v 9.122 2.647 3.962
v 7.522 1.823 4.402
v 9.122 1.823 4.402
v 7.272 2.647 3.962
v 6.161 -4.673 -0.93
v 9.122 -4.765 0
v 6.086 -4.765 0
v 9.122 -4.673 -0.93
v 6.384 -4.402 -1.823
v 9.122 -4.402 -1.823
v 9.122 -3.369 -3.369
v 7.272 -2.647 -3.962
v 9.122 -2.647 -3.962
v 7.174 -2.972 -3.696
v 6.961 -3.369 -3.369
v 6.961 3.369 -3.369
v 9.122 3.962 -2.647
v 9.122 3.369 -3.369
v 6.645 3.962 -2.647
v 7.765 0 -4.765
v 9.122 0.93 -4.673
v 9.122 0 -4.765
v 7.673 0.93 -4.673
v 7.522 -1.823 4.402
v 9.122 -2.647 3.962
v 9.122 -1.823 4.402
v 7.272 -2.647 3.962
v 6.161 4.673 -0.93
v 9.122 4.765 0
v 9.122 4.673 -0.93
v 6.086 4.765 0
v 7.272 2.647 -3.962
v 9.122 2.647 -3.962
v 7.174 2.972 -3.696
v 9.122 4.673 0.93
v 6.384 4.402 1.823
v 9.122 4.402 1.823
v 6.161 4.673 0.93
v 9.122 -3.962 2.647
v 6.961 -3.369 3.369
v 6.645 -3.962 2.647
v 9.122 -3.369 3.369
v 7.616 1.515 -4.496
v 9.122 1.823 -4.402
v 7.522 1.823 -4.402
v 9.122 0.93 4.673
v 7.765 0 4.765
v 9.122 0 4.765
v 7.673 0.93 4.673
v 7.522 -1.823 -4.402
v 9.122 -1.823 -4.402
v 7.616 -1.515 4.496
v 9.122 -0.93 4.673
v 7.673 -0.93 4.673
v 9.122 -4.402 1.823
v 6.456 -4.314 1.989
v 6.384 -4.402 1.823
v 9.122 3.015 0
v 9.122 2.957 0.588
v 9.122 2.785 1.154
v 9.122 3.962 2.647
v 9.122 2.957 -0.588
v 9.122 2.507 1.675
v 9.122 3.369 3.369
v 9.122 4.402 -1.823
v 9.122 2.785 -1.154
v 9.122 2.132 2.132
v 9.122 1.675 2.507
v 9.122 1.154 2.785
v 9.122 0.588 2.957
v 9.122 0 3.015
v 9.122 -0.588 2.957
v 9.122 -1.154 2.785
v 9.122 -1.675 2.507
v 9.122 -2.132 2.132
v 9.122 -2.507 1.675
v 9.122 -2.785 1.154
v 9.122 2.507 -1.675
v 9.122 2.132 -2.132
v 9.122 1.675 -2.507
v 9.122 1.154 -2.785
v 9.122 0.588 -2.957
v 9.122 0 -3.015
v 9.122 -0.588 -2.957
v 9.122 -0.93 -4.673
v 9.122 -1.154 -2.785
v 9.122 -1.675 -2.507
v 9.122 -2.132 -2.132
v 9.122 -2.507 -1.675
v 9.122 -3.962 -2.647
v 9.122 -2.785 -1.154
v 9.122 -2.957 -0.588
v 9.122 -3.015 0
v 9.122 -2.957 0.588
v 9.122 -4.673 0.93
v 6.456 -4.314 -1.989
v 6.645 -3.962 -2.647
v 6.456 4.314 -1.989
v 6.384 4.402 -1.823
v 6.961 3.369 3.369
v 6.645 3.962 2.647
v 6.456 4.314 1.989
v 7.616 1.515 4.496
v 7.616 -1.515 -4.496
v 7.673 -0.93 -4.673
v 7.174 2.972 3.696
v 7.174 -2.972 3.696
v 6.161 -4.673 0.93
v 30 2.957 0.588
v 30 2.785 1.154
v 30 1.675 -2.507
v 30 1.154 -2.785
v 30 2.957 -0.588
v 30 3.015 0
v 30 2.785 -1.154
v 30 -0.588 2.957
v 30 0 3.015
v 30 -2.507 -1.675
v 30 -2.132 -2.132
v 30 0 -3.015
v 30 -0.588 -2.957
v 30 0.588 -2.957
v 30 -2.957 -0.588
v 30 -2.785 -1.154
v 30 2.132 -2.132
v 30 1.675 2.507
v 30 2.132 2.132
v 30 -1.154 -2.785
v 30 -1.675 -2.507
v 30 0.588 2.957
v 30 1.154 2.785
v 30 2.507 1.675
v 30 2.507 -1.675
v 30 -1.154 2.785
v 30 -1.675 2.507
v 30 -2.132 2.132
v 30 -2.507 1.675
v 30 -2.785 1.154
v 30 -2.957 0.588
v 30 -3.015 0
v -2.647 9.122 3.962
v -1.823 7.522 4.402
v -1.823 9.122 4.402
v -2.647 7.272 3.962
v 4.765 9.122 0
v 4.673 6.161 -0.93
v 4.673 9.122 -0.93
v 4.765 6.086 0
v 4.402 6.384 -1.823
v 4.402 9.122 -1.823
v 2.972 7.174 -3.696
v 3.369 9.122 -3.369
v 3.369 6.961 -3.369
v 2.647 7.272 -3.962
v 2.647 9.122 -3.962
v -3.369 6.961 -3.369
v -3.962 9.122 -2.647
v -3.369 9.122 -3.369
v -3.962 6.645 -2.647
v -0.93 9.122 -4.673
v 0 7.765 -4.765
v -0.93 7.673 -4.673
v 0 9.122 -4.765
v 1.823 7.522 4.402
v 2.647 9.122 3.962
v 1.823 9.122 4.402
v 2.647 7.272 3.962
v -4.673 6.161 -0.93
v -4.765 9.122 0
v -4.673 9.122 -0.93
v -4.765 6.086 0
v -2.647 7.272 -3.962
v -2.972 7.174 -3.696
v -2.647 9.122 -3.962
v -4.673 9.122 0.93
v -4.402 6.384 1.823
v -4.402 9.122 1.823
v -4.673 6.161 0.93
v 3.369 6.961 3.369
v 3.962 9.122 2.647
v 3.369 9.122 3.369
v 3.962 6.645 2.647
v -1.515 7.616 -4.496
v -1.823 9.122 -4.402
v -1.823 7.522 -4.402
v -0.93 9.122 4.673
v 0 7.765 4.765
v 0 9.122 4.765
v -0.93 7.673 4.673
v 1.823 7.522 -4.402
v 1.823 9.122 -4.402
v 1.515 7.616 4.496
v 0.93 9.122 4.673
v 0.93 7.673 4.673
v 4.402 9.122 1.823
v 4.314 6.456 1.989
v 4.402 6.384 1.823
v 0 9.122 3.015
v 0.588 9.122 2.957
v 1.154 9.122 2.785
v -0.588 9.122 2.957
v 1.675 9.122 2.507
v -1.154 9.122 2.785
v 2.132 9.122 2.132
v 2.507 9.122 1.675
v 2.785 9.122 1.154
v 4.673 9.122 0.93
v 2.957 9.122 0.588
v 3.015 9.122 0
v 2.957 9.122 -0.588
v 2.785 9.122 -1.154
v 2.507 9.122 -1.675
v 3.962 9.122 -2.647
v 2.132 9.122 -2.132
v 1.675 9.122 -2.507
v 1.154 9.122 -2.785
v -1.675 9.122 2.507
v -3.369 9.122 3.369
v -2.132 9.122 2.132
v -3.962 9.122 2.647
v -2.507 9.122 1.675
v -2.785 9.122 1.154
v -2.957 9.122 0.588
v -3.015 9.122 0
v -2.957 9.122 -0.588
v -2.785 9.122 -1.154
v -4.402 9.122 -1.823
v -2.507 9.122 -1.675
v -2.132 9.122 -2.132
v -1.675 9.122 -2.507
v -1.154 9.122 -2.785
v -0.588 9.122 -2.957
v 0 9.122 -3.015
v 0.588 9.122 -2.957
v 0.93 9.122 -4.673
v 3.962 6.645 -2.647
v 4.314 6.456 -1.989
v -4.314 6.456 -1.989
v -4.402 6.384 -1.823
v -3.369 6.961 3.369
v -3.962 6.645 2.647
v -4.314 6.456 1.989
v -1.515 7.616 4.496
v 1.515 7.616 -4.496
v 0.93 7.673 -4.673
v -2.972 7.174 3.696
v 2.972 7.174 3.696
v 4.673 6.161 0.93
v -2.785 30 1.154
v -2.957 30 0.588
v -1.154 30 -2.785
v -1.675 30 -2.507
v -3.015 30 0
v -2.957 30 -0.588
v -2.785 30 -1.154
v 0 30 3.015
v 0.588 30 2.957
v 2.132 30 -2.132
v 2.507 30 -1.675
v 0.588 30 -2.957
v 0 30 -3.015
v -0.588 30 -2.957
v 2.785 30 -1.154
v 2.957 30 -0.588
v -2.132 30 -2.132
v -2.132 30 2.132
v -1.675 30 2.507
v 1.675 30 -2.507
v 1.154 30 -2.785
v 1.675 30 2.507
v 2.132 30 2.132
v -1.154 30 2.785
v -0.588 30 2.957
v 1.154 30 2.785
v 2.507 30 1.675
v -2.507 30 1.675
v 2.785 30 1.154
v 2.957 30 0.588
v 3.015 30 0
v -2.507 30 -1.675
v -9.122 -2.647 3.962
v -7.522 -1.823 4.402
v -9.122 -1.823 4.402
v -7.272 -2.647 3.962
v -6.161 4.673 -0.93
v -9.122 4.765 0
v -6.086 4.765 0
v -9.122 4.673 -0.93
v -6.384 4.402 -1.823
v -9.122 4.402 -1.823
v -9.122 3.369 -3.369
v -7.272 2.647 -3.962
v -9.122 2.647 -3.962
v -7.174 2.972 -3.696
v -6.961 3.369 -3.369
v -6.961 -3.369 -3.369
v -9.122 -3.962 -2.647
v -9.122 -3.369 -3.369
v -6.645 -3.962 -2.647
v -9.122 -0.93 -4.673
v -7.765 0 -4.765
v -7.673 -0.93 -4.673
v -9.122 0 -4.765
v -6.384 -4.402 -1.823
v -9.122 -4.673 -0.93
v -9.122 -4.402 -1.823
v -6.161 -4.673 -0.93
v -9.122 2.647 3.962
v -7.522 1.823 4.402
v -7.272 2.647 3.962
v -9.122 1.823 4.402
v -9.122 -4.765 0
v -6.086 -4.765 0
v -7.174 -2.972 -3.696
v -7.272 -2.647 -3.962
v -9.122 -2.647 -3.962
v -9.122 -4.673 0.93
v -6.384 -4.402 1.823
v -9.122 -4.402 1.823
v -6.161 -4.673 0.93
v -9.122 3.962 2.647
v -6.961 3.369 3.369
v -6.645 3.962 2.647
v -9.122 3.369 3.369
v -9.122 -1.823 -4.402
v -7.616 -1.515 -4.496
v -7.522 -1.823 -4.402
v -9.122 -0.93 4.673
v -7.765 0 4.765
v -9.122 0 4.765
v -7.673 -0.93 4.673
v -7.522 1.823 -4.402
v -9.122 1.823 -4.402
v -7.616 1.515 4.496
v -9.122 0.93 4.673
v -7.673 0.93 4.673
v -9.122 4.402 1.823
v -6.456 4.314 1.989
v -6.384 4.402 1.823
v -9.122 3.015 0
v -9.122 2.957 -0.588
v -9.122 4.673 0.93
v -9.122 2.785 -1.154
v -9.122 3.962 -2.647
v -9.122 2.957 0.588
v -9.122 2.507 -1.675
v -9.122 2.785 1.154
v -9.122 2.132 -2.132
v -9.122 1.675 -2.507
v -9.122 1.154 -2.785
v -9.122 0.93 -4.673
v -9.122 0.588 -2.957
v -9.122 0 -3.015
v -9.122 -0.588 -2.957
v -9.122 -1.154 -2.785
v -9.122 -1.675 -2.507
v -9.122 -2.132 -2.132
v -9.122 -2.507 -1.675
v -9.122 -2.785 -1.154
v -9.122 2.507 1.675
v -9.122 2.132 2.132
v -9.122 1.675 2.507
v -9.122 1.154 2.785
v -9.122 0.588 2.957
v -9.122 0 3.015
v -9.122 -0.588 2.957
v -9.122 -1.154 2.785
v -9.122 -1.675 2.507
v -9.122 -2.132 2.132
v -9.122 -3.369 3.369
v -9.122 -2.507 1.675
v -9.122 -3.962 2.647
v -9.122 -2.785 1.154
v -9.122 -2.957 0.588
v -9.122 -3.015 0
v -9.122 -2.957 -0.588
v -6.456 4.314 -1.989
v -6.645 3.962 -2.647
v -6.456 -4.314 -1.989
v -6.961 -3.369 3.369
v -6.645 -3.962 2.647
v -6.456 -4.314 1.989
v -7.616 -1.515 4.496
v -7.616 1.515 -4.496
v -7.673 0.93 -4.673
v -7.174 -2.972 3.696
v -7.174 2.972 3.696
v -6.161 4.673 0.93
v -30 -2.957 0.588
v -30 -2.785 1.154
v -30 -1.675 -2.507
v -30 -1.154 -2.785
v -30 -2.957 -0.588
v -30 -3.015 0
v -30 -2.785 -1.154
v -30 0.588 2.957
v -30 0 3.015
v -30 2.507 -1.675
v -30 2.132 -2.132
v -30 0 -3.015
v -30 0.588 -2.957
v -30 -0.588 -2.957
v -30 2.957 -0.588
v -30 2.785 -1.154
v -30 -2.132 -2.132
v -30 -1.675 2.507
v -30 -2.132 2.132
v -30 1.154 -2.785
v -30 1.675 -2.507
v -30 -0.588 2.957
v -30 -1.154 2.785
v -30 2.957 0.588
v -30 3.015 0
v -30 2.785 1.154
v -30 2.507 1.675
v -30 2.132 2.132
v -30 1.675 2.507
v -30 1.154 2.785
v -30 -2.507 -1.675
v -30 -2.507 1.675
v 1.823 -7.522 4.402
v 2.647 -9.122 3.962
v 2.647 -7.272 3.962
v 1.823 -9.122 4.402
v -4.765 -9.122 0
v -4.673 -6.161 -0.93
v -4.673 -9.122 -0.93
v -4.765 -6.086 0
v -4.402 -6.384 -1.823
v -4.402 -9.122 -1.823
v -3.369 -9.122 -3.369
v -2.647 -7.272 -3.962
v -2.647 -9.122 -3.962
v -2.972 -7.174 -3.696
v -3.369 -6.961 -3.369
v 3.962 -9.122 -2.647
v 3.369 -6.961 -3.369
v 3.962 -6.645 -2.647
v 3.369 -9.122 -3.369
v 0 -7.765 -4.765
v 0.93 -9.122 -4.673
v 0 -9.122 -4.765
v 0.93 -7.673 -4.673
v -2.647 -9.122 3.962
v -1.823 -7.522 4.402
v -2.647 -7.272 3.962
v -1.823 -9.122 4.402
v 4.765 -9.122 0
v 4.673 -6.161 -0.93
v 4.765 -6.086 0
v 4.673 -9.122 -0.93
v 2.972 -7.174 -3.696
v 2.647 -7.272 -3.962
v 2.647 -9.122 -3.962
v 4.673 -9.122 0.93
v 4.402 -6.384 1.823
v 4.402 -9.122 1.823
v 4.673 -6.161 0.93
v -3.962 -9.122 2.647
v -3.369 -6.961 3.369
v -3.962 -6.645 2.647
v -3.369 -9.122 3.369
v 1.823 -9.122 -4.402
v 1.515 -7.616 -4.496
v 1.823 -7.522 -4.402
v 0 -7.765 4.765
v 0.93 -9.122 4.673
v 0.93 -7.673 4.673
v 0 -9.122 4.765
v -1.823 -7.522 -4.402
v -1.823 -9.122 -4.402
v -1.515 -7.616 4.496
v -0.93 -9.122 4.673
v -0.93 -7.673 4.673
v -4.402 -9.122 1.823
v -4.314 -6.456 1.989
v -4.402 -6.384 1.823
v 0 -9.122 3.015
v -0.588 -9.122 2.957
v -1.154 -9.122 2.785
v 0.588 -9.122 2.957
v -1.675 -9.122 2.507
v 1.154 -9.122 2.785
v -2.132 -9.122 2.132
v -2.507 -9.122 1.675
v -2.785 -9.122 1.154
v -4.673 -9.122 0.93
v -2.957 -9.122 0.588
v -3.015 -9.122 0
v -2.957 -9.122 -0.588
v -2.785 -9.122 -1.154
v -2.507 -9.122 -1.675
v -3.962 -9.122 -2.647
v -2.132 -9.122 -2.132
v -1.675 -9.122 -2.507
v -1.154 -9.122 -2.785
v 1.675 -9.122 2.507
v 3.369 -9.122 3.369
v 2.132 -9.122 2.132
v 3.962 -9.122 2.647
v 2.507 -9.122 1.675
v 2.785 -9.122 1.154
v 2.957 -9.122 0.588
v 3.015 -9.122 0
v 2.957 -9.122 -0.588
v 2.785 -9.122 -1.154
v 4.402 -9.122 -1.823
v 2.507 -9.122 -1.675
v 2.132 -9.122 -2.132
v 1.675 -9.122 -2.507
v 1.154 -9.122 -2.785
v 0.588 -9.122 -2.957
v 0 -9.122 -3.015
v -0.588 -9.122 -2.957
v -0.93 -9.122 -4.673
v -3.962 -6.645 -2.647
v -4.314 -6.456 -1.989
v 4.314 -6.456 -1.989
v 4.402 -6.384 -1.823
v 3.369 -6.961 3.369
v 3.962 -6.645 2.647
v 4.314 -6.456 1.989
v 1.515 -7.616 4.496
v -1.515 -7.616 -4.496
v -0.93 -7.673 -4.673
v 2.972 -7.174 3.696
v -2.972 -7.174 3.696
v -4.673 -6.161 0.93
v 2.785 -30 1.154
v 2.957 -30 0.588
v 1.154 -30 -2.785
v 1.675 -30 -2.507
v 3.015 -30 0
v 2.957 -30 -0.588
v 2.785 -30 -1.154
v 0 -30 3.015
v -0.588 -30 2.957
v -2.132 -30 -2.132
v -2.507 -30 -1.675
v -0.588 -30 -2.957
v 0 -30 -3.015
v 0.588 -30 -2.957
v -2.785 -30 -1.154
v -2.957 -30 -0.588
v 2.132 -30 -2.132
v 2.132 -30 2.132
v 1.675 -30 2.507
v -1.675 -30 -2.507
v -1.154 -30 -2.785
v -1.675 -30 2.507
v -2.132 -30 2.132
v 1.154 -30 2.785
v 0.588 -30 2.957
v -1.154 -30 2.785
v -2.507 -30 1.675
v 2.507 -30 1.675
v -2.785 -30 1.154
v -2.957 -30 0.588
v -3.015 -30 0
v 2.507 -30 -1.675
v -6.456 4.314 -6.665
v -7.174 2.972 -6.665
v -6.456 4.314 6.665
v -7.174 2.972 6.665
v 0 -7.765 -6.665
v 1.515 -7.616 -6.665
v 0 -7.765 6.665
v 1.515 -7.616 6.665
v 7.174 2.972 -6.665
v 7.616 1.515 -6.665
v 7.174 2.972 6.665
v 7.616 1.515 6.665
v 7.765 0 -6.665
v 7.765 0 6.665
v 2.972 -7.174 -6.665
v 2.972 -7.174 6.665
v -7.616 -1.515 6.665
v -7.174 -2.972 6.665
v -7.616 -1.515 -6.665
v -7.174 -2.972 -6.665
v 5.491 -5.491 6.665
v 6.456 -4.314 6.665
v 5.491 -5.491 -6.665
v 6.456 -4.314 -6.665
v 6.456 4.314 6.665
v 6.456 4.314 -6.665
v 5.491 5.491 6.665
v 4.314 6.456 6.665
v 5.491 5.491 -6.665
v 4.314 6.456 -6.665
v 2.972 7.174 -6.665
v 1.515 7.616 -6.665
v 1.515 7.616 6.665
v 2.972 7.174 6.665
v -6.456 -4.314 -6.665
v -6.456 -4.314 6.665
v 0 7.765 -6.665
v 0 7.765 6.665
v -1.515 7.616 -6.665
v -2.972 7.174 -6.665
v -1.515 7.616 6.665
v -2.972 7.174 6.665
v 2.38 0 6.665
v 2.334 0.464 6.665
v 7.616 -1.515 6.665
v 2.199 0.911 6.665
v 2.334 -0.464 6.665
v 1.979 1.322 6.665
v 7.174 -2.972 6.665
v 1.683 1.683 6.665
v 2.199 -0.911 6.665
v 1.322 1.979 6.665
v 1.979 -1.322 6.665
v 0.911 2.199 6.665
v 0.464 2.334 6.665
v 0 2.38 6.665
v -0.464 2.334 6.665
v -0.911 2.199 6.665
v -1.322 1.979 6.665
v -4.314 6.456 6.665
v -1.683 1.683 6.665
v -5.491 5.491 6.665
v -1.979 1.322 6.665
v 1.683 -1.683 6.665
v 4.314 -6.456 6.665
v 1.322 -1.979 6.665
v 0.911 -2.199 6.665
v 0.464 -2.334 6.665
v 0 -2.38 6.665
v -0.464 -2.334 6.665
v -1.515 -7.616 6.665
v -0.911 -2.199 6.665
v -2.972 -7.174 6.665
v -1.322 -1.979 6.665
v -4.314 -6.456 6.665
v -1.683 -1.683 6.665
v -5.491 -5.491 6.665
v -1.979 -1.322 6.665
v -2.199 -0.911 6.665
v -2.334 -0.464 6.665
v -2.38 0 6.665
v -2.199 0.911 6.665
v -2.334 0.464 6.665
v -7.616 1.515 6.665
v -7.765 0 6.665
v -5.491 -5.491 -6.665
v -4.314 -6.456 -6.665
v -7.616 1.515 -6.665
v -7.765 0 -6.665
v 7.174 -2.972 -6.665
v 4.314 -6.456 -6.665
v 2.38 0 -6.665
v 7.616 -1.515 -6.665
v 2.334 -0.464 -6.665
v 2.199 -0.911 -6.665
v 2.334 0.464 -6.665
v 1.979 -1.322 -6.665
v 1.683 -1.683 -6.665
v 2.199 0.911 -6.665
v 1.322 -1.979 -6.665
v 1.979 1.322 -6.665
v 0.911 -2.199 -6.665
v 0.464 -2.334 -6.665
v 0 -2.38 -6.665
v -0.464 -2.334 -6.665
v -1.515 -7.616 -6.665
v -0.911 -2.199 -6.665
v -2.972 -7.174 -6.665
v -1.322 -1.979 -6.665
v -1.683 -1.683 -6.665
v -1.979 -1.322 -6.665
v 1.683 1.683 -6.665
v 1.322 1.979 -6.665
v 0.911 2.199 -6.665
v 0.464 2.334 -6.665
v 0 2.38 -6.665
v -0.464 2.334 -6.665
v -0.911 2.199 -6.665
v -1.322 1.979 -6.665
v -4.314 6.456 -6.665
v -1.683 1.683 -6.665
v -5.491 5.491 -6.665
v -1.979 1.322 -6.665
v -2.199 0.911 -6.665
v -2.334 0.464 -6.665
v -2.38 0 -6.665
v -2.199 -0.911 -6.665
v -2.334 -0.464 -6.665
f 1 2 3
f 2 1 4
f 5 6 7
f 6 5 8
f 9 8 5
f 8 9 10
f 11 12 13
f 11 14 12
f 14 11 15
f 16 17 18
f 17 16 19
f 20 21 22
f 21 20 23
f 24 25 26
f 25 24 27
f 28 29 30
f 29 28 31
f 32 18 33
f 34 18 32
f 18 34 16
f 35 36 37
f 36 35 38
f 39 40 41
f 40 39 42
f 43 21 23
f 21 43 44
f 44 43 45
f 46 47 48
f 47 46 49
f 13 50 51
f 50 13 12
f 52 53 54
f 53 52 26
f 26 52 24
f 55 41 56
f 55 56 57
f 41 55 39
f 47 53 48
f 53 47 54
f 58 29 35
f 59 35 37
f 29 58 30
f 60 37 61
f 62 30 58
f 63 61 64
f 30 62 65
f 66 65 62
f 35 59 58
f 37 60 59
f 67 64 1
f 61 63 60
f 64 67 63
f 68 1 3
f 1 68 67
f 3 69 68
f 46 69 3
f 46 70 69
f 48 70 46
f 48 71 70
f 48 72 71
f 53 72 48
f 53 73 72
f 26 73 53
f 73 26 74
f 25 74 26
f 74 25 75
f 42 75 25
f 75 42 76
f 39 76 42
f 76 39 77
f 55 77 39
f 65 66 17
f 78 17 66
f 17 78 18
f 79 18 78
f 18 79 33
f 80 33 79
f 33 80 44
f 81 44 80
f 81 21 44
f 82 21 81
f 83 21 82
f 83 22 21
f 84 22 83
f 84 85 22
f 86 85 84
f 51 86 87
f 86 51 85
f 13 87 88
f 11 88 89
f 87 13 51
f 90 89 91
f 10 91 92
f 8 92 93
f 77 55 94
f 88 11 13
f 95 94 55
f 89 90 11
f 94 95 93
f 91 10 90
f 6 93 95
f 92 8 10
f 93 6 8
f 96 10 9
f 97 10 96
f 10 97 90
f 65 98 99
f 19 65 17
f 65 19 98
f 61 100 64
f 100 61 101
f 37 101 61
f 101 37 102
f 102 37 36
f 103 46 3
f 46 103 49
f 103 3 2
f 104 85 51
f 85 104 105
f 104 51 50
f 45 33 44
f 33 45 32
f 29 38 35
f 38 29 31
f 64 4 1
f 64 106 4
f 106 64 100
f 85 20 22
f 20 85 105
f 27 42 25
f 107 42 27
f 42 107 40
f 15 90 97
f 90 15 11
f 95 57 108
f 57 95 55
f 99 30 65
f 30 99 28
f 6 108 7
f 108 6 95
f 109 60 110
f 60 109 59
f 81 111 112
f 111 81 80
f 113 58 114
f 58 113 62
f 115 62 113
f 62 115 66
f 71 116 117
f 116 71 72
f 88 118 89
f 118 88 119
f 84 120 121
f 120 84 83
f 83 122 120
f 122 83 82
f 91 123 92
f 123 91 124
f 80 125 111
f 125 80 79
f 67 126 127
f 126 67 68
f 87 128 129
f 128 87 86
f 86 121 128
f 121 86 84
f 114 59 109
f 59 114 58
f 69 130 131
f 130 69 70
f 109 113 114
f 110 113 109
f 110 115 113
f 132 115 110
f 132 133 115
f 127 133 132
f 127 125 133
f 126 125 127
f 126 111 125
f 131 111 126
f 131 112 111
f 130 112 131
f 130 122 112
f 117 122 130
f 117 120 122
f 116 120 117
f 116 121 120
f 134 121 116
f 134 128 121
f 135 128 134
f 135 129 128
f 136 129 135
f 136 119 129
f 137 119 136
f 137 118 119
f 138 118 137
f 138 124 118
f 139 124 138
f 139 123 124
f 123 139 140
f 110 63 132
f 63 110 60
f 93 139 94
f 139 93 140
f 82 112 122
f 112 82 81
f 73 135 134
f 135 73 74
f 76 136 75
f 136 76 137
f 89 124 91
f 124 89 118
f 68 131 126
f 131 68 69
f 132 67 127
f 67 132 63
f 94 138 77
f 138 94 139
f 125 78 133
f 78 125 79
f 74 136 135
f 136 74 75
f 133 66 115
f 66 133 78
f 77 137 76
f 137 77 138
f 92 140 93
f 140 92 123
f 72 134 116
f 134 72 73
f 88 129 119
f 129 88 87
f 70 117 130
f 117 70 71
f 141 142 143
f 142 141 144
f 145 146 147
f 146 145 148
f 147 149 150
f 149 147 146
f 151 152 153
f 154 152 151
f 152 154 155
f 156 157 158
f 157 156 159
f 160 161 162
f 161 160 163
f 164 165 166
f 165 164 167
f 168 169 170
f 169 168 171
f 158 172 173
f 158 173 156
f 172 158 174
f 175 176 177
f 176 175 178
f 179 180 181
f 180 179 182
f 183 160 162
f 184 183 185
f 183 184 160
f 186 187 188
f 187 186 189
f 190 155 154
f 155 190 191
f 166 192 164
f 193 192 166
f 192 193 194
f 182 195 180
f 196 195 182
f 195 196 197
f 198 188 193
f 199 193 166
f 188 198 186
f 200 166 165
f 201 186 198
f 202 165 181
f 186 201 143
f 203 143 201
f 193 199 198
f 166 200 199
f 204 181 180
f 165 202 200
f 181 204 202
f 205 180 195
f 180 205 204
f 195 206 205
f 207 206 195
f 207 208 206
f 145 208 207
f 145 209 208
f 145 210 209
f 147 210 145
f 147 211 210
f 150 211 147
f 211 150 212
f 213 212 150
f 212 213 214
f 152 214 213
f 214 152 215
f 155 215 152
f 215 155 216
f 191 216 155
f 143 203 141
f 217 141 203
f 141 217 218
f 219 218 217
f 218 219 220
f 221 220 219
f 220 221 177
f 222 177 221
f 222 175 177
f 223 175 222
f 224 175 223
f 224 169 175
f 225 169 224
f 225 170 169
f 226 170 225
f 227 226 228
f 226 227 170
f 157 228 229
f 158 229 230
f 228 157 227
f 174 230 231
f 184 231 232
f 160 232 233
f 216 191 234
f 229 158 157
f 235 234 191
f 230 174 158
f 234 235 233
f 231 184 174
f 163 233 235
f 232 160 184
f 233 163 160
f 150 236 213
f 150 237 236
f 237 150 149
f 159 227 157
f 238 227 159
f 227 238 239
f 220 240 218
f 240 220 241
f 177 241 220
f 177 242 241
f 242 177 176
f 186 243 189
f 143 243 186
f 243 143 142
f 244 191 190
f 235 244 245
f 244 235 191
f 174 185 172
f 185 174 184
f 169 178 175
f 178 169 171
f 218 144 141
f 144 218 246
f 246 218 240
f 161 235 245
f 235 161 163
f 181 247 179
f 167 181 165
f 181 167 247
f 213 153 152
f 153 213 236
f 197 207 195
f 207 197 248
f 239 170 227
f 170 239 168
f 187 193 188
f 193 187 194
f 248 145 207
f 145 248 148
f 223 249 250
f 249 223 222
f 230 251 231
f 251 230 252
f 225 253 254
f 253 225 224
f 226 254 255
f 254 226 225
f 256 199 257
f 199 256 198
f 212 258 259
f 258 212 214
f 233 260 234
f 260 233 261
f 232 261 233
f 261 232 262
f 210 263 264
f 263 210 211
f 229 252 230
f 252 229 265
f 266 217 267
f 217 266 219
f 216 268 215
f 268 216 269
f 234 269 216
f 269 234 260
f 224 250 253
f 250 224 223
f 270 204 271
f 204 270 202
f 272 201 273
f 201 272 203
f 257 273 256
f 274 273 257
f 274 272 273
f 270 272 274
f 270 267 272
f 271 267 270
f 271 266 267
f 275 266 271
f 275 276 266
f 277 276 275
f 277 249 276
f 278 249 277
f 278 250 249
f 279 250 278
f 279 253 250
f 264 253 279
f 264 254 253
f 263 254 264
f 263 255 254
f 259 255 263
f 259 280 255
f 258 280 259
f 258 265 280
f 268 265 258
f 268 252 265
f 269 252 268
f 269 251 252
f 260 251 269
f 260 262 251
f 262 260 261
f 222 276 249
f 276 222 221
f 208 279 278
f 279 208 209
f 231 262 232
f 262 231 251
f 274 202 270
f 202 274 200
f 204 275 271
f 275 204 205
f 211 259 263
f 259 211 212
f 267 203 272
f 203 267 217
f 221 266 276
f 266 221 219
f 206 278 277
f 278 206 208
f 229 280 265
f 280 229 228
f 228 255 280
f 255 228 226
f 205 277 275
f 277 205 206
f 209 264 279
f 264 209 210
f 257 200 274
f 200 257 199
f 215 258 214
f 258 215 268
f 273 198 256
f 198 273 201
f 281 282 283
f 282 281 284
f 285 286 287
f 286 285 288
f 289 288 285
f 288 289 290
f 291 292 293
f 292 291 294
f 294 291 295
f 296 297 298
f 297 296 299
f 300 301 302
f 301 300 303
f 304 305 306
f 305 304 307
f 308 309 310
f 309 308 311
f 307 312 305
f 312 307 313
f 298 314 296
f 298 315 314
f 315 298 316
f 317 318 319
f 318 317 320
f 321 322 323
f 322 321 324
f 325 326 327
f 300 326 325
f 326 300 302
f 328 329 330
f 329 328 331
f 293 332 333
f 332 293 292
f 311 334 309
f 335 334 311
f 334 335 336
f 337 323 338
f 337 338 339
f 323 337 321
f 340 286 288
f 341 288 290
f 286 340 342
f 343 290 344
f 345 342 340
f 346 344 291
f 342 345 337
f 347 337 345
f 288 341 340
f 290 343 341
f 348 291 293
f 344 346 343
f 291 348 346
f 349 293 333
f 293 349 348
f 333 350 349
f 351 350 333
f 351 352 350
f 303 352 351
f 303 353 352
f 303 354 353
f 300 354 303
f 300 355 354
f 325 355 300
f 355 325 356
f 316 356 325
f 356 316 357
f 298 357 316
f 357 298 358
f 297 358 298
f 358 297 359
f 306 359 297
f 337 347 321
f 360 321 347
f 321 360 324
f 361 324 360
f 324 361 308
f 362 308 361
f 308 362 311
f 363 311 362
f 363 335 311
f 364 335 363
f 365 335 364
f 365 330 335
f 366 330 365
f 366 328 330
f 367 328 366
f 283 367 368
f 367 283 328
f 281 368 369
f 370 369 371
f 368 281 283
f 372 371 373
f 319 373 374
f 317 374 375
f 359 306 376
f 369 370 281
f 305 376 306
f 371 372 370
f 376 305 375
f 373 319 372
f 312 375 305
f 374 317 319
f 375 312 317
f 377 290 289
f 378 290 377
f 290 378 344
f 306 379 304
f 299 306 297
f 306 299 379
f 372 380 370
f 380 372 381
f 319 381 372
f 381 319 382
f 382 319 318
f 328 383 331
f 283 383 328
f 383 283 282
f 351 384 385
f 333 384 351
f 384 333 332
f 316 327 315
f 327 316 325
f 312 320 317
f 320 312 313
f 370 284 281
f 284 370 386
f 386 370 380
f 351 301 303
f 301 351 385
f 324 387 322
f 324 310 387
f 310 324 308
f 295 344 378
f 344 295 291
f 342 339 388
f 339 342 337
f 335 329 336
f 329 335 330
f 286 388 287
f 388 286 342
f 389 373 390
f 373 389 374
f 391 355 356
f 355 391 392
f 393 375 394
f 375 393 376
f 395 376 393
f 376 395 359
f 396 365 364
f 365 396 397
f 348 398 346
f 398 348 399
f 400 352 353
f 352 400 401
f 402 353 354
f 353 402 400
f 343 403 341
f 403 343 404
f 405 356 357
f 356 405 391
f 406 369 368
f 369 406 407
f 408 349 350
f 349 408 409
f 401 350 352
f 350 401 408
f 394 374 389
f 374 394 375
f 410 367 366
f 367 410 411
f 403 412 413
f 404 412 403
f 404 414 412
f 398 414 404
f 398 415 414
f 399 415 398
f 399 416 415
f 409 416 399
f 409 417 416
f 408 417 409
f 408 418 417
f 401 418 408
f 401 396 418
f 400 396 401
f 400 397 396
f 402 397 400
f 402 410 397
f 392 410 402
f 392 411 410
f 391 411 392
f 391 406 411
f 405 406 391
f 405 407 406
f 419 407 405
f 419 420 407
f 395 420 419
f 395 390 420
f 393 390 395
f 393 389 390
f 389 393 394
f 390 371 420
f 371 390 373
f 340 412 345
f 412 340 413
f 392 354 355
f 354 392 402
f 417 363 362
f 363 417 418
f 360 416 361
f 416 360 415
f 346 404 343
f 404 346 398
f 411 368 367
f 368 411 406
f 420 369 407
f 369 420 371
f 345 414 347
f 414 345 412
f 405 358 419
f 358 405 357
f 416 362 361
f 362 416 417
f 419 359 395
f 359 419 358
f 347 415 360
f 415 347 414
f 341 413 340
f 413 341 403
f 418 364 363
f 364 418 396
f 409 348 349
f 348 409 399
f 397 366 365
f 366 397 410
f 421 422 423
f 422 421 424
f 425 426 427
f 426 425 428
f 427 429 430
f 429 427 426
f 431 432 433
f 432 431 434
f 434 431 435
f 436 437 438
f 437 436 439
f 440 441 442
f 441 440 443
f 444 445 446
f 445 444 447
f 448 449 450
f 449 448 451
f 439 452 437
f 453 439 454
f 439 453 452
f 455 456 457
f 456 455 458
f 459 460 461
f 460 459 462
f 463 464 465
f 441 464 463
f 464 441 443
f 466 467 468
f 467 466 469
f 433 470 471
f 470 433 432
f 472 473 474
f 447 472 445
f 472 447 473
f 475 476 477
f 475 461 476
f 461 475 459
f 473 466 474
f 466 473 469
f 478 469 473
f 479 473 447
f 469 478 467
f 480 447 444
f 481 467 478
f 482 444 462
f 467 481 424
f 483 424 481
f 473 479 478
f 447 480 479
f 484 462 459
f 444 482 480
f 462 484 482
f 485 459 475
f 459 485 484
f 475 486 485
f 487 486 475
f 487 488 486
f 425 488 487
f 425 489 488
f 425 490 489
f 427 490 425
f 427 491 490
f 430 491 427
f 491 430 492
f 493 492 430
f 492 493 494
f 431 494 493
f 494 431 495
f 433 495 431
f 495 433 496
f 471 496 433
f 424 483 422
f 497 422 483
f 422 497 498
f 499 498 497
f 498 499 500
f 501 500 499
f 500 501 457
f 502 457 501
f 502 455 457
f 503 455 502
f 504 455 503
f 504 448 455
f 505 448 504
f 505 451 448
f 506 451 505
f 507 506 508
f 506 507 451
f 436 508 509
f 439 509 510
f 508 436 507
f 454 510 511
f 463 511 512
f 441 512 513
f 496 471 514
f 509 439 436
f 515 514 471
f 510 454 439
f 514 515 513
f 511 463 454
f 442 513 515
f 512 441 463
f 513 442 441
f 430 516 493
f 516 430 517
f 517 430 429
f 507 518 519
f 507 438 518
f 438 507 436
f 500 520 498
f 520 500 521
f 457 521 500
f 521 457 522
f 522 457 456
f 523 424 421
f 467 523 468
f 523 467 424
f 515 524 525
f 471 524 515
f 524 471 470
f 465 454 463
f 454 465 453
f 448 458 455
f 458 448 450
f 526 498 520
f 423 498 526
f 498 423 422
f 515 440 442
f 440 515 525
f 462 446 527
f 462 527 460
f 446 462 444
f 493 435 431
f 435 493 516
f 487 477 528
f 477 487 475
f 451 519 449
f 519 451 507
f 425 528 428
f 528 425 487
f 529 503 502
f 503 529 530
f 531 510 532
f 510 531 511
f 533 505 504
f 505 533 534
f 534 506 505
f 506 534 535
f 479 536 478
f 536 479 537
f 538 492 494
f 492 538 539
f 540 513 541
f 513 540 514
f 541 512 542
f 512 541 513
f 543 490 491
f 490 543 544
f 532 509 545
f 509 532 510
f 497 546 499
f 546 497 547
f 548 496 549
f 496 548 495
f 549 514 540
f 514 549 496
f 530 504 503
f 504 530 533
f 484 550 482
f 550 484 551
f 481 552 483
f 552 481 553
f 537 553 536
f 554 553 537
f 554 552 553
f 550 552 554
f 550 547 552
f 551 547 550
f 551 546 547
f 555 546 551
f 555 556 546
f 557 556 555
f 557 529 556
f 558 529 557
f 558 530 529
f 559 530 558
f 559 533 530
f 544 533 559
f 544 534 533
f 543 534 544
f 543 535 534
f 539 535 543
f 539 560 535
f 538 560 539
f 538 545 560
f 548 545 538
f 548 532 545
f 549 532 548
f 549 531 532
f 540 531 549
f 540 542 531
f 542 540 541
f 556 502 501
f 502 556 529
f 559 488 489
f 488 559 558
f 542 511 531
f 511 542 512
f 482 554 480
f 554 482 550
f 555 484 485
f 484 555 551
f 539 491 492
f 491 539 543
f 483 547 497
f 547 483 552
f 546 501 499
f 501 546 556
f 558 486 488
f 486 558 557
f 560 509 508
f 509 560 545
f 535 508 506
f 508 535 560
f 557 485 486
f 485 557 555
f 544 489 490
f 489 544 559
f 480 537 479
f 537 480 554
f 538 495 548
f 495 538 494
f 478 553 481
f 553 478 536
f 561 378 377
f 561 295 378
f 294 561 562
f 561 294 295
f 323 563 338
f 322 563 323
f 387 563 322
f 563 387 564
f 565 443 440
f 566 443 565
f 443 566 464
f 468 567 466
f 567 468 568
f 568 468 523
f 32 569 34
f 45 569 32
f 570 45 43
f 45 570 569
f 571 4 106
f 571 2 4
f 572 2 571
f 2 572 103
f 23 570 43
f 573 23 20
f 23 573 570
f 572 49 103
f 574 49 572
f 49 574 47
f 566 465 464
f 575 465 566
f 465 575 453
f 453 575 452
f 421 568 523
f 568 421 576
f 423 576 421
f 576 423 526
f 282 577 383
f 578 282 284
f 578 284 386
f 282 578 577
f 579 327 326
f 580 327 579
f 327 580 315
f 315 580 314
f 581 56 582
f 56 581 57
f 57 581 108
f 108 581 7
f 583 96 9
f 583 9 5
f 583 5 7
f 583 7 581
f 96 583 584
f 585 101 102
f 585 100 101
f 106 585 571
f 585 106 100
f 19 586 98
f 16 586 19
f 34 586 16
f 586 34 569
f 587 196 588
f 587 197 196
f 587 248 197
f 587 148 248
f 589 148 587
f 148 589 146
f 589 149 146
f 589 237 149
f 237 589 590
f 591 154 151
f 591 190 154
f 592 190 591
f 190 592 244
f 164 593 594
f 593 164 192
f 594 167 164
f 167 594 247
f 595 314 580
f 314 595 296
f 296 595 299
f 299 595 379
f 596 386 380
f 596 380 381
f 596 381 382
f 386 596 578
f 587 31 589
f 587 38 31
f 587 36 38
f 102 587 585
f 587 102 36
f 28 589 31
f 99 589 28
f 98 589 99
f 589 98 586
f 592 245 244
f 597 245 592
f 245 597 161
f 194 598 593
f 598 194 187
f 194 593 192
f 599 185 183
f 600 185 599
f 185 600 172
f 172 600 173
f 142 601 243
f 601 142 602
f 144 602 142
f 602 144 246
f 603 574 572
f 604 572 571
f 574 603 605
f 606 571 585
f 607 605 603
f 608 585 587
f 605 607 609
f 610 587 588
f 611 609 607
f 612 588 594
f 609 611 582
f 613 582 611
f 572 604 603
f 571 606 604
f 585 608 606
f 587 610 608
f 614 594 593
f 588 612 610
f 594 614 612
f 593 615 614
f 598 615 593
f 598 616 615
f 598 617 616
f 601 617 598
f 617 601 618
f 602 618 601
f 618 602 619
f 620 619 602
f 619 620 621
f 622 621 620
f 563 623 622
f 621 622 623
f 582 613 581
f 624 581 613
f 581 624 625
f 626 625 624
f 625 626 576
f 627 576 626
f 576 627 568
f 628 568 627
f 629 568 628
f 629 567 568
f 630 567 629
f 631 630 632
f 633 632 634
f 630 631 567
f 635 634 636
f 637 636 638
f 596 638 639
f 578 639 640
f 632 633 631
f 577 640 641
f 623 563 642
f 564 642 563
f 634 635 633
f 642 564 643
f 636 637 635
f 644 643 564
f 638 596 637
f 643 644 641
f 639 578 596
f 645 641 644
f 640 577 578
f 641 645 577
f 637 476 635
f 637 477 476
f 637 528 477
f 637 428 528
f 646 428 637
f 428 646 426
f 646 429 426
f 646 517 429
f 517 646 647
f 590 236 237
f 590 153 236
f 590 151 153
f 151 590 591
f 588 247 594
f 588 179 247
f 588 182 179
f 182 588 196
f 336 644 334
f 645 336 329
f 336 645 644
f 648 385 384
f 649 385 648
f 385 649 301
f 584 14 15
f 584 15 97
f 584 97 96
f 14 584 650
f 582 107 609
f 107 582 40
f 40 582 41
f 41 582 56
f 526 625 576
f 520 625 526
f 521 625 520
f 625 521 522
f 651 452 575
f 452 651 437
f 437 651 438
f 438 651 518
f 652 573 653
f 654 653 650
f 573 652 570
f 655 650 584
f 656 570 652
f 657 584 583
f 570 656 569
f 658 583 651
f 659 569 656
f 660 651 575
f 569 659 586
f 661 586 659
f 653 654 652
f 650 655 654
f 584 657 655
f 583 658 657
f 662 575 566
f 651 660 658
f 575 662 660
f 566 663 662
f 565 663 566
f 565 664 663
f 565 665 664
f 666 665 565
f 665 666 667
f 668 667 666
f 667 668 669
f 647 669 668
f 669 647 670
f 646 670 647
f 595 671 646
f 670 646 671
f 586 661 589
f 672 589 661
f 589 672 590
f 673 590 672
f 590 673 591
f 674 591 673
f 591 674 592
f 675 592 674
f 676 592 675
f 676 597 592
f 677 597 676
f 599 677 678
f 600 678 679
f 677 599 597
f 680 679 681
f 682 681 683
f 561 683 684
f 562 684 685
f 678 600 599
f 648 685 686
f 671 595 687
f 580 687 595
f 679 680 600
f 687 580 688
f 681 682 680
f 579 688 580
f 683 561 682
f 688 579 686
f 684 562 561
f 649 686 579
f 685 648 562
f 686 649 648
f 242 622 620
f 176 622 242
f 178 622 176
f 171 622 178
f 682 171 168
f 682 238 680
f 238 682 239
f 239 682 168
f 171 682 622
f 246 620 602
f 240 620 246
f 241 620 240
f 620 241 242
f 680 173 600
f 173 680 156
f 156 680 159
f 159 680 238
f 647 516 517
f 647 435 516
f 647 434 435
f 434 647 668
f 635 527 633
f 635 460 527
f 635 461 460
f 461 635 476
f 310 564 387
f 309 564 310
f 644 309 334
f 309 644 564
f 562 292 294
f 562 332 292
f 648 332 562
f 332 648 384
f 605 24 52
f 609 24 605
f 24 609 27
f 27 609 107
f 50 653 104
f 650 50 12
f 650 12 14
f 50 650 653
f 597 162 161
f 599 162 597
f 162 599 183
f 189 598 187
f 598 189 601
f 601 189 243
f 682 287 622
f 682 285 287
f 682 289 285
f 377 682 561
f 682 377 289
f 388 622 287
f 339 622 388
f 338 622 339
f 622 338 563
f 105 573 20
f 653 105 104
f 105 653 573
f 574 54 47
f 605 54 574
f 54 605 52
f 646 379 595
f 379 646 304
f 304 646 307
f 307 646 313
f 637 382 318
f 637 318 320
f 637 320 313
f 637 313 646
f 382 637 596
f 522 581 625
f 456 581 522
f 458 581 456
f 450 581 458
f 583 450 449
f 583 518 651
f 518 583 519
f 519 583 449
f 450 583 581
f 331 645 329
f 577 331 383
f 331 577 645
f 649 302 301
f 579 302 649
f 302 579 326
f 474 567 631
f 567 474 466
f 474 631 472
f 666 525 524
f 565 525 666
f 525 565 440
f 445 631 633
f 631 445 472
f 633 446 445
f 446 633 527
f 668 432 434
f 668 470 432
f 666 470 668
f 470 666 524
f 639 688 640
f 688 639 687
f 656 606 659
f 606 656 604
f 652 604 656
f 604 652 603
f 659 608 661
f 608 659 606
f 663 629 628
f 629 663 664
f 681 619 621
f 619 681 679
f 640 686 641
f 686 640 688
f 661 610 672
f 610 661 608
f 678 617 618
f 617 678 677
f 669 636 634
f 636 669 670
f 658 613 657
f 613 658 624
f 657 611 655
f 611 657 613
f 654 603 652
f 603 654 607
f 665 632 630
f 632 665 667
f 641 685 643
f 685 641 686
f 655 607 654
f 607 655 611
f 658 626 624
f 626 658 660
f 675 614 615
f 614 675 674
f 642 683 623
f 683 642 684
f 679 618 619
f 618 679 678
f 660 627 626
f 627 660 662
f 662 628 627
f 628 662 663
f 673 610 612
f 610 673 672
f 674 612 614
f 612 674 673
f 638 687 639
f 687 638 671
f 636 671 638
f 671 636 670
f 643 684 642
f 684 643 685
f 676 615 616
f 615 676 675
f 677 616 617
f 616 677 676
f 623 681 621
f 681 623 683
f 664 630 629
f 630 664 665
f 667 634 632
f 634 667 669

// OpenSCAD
$fn = 32;

// ----------------------------------------------------------------------
// Cardan cross: 60 mm span, 9.53 mm trunnions
// ----------------------------------------------------------------------

// --- parameters (mm) ---
journal_d = 9.53;         // trunnion diameter
arm_len = 30;             // trunnion length from the centre
step_r = 3.24;            // step position from the centre
step_d = 6.03;            // journal diameter after the step
hub_d = 15.53;            // hub diameter
hub_h = 13.33;            // hub height
bore_d = 4.76;            // hub bore

difference() {
  union() {
    /* hub along the joint axis */
    cylinder(h = hub_h, d = hub_d, center = true);
    for (a = [0 : 90 : 270]) rotate([0, 0, a]) {
      /* trunnion, sunk into the hub */
      translate([hub_d / 4, 0, 0]) rotate([0, 90, 0]) cylinder(h = step_r + 2, d = journal_d);
      /* stepped journal out to the tip */
      translate([step_r - 0.5, 0, 0]) rotate([0, 90, 0]) cylinder(h = arm_len + 0.5 - step_r, d = step_d);
    }
  }
  /* lubrication bore through the hub, 2.5 mm clear on both sides */
  translate([0, 0, -hub_h / 2 - 2.5]) cylinder(h = hub_h + 5, d = bore_d);
}
